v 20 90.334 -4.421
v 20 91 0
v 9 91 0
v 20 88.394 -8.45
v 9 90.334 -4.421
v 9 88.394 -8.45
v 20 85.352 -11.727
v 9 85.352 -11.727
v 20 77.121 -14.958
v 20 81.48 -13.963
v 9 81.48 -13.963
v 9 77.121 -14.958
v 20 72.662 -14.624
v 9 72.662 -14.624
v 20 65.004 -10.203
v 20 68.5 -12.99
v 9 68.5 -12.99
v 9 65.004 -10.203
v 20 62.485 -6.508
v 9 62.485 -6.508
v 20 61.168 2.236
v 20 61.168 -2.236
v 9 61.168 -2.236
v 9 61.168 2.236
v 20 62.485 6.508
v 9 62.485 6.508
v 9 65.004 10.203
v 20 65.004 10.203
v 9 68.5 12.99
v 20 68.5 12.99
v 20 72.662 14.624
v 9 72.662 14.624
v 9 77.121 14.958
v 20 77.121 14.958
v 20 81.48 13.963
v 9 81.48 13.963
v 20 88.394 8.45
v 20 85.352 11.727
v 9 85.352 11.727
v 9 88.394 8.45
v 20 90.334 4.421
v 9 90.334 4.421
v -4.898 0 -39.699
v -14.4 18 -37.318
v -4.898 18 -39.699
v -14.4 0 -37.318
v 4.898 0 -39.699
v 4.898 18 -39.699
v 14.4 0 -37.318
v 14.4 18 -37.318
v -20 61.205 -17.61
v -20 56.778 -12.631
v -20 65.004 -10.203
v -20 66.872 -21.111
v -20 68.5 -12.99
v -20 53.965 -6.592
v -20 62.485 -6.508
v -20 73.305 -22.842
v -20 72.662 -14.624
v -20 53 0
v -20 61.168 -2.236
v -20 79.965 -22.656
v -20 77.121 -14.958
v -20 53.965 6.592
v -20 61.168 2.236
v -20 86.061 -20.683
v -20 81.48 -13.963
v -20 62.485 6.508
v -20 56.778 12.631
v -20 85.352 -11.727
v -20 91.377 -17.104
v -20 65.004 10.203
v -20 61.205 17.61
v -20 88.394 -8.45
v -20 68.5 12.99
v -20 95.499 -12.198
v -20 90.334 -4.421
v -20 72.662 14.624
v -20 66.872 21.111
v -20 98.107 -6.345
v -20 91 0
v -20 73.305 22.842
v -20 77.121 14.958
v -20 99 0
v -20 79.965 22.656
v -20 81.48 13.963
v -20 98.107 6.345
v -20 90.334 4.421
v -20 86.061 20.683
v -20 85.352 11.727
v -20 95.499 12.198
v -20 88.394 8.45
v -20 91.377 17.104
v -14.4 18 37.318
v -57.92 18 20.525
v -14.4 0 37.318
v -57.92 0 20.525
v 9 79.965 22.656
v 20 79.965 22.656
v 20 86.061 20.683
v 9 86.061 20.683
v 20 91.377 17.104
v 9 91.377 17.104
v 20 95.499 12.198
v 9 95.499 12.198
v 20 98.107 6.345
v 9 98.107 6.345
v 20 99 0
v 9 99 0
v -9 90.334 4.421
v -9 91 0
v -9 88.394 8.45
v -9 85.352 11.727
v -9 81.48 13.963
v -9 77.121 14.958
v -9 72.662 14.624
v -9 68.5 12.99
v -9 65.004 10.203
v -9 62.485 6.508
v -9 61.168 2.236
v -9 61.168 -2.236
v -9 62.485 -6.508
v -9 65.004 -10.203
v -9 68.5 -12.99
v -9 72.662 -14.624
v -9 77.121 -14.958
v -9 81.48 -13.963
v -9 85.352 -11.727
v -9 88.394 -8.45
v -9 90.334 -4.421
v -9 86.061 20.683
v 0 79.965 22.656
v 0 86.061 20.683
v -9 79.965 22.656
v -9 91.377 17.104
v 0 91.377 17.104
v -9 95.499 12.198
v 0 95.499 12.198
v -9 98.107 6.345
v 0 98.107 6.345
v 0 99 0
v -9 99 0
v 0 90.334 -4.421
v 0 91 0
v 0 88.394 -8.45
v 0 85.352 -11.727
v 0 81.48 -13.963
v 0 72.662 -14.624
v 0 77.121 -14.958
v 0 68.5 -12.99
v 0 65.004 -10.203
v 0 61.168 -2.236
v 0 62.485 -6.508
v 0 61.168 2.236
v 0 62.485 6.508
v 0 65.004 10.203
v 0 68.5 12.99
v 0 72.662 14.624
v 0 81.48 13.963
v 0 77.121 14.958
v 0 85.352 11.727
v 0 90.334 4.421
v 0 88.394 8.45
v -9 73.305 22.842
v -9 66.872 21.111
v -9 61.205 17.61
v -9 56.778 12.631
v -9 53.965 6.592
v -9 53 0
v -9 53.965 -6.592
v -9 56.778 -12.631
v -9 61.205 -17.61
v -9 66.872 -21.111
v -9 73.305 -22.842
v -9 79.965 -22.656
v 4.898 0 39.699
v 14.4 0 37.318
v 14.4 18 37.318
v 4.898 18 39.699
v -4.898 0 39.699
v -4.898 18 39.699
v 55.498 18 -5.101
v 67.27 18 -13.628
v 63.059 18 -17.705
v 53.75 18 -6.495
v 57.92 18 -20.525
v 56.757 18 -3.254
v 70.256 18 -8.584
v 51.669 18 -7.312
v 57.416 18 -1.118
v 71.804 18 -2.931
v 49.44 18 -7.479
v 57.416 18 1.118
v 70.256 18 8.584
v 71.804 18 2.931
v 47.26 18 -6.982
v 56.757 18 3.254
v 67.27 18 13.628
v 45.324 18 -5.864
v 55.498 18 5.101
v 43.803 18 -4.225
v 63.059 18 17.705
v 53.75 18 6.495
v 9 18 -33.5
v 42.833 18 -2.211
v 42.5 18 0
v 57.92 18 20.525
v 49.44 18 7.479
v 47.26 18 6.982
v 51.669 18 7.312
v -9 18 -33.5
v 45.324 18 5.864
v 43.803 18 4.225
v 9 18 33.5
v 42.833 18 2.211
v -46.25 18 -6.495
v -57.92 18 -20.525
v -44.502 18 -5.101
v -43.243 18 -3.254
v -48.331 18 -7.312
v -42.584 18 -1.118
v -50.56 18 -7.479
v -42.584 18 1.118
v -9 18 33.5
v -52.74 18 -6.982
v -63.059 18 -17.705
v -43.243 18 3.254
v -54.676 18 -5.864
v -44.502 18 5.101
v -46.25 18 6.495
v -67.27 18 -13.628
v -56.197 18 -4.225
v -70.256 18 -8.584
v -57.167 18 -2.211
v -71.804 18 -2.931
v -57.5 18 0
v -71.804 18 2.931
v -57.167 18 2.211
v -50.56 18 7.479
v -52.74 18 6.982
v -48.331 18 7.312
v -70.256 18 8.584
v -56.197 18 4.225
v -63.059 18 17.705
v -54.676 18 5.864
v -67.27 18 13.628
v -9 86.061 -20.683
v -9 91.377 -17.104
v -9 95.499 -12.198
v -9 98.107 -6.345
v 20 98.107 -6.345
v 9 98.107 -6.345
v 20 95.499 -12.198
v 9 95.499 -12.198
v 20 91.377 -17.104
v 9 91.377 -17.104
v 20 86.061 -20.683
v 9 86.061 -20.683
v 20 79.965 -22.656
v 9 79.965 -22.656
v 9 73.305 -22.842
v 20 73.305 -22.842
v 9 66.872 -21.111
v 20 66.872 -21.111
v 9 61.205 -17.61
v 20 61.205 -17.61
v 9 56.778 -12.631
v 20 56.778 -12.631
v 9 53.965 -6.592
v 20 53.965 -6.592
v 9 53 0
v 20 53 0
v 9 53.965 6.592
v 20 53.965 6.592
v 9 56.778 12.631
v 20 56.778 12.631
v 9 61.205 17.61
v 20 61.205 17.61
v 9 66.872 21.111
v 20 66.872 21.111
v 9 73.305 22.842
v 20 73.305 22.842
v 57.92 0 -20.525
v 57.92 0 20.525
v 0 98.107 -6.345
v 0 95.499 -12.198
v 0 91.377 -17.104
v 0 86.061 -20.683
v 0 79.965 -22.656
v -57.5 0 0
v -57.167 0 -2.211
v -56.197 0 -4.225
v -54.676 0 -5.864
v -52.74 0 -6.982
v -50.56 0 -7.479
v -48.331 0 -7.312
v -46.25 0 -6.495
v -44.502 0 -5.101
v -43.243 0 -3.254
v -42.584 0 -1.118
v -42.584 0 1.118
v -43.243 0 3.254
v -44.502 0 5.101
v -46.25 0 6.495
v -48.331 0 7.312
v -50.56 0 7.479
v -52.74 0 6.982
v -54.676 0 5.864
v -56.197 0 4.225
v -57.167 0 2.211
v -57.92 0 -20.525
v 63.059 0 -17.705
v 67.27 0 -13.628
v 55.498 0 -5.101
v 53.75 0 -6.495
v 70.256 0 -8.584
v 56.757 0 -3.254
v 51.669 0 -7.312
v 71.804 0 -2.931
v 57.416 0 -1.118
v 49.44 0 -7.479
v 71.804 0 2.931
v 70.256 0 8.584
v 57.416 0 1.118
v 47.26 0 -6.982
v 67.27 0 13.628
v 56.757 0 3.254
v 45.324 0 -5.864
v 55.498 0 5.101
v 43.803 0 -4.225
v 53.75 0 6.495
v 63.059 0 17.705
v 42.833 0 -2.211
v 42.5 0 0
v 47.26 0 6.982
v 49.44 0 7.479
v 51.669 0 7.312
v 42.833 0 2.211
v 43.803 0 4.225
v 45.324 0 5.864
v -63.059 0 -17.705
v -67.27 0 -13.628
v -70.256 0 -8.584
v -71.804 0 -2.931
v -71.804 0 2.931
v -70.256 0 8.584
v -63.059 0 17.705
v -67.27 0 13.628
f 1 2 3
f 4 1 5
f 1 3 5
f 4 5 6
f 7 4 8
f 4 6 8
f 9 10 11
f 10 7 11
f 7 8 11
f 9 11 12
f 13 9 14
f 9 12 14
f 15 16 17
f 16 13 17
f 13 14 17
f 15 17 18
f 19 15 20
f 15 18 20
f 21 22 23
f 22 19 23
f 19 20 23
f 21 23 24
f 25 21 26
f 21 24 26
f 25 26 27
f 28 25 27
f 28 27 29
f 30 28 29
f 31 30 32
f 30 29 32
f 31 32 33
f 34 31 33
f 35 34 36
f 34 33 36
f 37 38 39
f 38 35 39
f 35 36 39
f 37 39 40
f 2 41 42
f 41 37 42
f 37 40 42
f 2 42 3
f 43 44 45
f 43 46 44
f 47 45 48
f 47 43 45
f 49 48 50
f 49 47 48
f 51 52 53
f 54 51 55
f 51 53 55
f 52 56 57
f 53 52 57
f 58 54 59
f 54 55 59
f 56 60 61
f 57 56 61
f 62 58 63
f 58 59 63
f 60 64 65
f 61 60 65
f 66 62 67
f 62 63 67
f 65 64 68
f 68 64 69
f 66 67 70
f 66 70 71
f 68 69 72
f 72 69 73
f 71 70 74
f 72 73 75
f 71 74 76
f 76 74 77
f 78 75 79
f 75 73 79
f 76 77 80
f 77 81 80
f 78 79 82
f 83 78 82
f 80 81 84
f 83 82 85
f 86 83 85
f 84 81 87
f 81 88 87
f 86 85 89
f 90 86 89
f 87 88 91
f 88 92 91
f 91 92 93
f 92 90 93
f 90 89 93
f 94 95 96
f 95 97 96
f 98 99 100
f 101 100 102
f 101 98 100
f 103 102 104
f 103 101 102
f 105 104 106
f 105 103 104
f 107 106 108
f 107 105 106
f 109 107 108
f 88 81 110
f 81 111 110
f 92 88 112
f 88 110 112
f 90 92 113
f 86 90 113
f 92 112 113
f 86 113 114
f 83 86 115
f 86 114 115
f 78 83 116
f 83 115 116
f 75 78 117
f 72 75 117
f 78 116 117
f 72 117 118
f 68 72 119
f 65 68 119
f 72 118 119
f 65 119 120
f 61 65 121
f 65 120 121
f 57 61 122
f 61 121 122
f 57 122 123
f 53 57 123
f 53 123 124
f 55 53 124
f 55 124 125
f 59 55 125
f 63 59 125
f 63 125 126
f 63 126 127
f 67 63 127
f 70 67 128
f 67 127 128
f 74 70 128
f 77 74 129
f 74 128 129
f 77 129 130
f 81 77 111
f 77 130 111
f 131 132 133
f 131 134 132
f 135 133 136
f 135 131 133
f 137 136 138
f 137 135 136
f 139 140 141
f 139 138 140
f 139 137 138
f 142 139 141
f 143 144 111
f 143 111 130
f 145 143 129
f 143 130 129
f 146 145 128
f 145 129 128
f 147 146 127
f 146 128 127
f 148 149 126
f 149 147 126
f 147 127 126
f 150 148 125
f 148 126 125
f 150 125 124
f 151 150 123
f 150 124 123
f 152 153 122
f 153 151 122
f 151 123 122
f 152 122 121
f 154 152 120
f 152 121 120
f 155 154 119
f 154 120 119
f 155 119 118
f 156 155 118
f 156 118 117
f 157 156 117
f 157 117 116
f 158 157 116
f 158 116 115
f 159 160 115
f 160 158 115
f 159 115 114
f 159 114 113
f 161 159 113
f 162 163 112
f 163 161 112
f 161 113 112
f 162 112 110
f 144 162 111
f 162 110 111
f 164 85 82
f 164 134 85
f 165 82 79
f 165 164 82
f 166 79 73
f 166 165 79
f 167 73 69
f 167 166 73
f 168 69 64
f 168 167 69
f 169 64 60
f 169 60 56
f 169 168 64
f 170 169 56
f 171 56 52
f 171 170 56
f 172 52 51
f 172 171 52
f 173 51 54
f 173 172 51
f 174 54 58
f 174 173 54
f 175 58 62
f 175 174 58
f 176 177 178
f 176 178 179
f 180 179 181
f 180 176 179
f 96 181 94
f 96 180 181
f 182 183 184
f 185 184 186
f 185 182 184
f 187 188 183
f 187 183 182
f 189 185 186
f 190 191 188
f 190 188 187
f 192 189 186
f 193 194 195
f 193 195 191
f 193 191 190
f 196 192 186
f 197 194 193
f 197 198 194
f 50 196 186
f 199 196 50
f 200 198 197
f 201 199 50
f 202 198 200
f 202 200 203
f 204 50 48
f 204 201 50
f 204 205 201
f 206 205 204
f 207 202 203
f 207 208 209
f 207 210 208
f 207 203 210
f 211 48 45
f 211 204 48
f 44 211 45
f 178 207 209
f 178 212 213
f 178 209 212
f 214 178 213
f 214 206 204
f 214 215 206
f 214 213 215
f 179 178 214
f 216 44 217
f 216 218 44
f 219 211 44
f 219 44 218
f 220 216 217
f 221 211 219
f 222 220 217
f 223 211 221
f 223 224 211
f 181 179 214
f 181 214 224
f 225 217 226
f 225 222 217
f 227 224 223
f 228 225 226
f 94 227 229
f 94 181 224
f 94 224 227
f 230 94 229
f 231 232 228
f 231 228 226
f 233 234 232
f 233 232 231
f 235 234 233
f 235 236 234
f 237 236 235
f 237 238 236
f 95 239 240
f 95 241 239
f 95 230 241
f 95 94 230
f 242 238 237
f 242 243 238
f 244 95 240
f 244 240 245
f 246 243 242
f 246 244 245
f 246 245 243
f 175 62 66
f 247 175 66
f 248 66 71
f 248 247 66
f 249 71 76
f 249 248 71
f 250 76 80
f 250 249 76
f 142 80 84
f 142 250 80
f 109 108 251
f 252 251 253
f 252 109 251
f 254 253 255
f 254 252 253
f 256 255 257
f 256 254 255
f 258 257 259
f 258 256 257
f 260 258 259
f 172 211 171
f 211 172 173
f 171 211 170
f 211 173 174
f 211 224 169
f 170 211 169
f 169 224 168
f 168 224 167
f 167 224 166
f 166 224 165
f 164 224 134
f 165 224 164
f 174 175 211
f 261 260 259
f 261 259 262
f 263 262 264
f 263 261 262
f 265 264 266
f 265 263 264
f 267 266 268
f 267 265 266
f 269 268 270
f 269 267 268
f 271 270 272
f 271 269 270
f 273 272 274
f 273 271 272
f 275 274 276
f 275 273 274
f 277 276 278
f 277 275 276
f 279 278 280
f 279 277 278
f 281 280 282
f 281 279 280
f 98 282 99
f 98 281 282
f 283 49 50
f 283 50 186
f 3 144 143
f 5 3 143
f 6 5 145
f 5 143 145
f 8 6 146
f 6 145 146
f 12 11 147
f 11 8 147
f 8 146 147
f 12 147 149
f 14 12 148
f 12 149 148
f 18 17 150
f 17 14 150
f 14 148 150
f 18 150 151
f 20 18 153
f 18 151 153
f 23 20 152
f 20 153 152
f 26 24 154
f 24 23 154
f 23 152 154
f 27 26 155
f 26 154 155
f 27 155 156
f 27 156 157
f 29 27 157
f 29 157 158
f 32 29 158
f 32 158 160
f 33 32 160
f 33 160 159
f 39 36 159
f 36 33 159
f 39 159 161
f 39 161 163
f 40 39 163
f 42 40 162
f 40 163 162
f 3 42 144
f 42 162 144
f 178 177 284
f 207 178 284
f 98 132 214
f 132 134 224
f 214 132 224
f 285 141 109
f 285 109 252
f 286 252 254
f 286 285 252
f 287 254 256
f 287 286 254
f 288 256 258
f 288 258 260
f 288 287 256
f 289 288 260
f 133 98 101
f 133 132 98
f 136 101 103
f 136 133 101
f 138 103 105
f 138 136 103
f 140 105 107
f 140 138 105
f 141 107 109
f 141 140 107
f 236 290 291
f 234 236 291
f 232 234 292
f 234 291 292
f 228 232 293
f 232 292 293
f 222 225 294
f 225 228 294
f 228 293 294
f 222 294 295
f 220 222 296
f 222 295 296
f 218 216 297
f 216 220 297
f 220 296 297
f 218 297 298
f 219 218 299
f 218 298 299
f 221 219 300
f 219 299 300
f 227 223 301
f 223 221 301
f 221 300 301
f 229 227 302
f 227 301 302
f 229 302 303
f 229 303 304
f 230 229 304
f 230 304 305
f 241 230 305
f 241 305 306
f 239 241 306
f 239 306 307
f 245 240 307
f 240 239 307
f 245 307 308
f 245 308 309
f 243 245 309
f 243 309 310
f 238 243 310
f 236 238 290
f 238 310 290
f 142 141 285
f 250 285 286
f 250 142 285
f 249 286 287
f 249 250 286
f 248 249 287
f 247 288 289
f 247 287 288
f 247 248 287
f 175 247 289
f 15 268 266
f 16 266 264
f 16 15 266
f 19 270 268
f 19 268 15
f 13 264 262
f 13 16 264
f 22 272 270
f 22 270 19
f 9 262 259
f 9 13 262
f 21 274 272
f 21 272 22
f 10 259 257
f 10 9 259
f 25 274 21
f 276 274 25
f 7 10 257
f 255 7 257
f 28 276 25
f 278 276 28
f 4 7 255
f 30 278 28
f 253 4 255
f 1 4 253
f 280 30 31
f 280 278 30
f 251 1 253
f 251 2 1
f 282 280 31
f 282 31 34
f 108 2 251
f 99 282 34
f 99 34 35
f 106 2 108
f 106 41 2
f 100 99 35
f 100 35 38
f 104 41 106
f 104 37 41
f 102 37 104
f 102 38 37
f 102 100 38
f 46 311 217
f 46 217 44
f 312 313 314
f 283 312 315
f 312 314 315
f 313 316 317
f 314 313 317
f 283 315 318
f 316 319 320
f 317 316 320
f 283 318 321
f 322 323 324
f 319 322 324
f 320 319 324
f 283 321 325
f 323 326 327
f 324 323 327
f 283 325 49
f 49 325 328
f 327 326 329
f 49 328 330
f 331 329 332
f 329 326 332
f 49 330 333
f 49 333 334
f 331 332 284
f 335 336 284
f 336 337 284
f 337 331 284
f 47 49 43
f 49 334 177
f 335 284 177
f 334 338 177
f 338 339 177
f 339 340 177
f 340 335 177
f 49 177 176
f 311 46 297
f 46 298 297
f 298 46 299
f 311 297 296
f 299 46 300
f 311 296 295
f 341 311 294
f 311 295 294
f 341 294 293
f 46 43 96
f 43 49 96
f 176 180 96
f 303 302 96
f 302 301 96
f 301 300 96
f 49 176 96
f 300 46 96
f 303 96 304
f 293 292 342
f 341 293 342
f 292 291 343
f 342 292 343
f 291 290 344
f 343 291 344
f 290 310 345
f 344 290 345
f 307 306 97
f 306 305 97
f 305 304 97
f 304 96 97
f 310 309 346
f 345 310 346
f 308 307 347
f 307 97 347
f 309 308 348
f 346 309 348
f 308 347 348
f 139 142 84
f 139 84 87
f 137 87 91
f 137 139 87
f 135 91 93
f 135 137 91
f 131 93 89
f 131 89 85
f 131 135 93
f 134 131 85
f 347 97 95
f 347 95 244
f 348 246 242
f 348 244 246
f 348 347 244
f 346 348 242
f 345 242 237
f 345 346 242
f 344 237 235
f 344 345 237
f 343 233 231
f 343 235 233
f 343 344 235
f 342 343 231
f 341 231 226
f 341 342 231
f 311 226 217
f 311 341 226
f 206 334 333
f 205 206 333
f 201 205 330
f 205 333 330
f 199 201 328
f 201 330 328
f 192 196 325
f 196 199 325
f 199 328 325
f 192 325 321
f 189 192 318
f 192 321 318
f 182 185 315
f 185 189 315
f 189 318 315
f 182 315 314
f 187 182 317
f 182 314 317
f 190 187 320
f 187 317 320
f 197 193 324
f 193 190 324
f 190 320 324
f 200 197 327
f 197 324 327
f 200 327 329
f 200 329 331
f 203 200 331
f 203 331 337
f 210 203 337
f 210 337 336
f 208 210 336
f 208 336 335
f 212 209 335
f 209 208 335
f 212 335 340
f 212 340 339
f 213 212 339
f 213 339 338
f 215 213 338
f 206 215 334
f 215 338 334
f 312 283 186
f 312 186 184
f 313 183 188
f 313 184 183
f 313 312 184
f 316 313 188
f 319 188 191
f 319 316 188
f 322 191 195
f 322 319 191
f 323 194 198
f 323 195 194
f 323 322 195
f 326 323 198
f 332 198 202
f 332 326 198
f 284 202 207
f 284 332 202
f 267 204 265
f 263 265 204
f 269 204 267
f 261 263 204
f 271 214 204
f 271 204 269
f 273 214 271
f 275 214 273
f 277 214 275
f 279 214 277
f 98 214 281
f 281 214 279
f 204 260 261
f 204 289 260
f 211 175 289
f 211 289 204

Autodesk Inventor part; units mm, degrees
ref_plane "YZ Plane" through (0, 0, 0) normal (1, 0, 0) x (0, 1, 0)
ref_plane "XZ Plane" through (0, 0, 0) normal (0, 1, 0) x (-1, 0, 0)
ref_plane "XY Plane" through (0, 0, 0) normal (0, 0, 1) x (1, 0, 0)
sketch "Sketch1" plane through (0, 0, 0) normal (0, 1, 0) x (-1, 0, 0)
  line L0 (50, 0) -> (-50, 0) construction
  line L1 (50, 22) -> (-50, 22)
  line L2 (-50, -22) -> (50, -22)
  arc A0 (50, -22) -> (50, 22) centre (50, 0) ccw
  arc A1 (-50, 22) -> (-50, -22) centre (-50, 0) ccw
  circle A2 centre (50, 0) radius 7.5
  circle A3 centre (-50, 0) radius 7.5
  line L3 (57.92, 20.525) -> (14.4, 37.3181)
  line L4 (-14.4, 37.3181) -> (-57.92, 20.525)
  line L5 (0, 0) -> (0, 42.8746) construction
  arc A4 (14.4, 37.3181) -> (-14.4, 37.3181) centre (0, 0) ccw
  line L6 (57.92, -20.525) -> (14.4, -37.3181)
  line L7 (-14.4, -37.3181) -> (-57.92, -20.525)
  line L8 (0, 0) -> (0, -42.8746) construction
  arc A5 (-14.4, -37.3181) -> (14.4, -37.3181) centre (0, 0) ccw
  point P0 (-57.92, -20.525)
  dimension "d0" = 100
  dimension "d1" = 40
  dimension "d2" = 15
  dimension "d3" = 22
extrude "Extrusion1" add sketch "Sketch1" along normal blind 18
sketch "Sketch2" plane through (0, 0, 0) normal (1, 0, 0) x (0, 1, 0)
  line L0 (0, 0) -> (76, 0) construction
  circle A0 centre (76, 0) radius 23
  circle A1 centre (76, 0) radius 15
  line L1 (18, -20.525) -> (18, -37.3181) construction
  line L2 (18, -37.3181) -> (18, -37.3181) construction
  line L3 (18, -37.3181) -> (18, -20.525) construction
  line L4 (18, -20.525) -> (18, 20.525) construction
  line L5 (18, 20.525) -> (18, 37.3181) construction
  line L6 (18, 37.3181) -> (18, 37.3181) construction
  line L7 (18, 37.3181) -> (18, 20.525) construction
  line L8 (18, 20.525) -> (18, -20.525) construction
  line L9 (18, 7.5) -> (18, -7.5) construction
  line L10 (18, 7.5) -> (18, -7.5) construction
  line L11 (79.9649, -22.6557) -> (18, -33.5)
  line L12 (79.9649, 22.6557) -> (18, 33.5)
  line L13 (18, -33.5) -> (18, 33.5)
  point P0 (79.9649, 22.6557)
  point P1 (18, 0)
  dimension "d8" = 46
  dimension "d7" = 67
  dimension "d9" = 30
  dimension "d14" = 116
extrude "Extrusion2" add sketch "Sketch2" along normal mid plane 18
extrude "Extrusion3" add sketch "Sketch2" along normal mid plane 40 contours A0
properties part number "ShaftSupport"
